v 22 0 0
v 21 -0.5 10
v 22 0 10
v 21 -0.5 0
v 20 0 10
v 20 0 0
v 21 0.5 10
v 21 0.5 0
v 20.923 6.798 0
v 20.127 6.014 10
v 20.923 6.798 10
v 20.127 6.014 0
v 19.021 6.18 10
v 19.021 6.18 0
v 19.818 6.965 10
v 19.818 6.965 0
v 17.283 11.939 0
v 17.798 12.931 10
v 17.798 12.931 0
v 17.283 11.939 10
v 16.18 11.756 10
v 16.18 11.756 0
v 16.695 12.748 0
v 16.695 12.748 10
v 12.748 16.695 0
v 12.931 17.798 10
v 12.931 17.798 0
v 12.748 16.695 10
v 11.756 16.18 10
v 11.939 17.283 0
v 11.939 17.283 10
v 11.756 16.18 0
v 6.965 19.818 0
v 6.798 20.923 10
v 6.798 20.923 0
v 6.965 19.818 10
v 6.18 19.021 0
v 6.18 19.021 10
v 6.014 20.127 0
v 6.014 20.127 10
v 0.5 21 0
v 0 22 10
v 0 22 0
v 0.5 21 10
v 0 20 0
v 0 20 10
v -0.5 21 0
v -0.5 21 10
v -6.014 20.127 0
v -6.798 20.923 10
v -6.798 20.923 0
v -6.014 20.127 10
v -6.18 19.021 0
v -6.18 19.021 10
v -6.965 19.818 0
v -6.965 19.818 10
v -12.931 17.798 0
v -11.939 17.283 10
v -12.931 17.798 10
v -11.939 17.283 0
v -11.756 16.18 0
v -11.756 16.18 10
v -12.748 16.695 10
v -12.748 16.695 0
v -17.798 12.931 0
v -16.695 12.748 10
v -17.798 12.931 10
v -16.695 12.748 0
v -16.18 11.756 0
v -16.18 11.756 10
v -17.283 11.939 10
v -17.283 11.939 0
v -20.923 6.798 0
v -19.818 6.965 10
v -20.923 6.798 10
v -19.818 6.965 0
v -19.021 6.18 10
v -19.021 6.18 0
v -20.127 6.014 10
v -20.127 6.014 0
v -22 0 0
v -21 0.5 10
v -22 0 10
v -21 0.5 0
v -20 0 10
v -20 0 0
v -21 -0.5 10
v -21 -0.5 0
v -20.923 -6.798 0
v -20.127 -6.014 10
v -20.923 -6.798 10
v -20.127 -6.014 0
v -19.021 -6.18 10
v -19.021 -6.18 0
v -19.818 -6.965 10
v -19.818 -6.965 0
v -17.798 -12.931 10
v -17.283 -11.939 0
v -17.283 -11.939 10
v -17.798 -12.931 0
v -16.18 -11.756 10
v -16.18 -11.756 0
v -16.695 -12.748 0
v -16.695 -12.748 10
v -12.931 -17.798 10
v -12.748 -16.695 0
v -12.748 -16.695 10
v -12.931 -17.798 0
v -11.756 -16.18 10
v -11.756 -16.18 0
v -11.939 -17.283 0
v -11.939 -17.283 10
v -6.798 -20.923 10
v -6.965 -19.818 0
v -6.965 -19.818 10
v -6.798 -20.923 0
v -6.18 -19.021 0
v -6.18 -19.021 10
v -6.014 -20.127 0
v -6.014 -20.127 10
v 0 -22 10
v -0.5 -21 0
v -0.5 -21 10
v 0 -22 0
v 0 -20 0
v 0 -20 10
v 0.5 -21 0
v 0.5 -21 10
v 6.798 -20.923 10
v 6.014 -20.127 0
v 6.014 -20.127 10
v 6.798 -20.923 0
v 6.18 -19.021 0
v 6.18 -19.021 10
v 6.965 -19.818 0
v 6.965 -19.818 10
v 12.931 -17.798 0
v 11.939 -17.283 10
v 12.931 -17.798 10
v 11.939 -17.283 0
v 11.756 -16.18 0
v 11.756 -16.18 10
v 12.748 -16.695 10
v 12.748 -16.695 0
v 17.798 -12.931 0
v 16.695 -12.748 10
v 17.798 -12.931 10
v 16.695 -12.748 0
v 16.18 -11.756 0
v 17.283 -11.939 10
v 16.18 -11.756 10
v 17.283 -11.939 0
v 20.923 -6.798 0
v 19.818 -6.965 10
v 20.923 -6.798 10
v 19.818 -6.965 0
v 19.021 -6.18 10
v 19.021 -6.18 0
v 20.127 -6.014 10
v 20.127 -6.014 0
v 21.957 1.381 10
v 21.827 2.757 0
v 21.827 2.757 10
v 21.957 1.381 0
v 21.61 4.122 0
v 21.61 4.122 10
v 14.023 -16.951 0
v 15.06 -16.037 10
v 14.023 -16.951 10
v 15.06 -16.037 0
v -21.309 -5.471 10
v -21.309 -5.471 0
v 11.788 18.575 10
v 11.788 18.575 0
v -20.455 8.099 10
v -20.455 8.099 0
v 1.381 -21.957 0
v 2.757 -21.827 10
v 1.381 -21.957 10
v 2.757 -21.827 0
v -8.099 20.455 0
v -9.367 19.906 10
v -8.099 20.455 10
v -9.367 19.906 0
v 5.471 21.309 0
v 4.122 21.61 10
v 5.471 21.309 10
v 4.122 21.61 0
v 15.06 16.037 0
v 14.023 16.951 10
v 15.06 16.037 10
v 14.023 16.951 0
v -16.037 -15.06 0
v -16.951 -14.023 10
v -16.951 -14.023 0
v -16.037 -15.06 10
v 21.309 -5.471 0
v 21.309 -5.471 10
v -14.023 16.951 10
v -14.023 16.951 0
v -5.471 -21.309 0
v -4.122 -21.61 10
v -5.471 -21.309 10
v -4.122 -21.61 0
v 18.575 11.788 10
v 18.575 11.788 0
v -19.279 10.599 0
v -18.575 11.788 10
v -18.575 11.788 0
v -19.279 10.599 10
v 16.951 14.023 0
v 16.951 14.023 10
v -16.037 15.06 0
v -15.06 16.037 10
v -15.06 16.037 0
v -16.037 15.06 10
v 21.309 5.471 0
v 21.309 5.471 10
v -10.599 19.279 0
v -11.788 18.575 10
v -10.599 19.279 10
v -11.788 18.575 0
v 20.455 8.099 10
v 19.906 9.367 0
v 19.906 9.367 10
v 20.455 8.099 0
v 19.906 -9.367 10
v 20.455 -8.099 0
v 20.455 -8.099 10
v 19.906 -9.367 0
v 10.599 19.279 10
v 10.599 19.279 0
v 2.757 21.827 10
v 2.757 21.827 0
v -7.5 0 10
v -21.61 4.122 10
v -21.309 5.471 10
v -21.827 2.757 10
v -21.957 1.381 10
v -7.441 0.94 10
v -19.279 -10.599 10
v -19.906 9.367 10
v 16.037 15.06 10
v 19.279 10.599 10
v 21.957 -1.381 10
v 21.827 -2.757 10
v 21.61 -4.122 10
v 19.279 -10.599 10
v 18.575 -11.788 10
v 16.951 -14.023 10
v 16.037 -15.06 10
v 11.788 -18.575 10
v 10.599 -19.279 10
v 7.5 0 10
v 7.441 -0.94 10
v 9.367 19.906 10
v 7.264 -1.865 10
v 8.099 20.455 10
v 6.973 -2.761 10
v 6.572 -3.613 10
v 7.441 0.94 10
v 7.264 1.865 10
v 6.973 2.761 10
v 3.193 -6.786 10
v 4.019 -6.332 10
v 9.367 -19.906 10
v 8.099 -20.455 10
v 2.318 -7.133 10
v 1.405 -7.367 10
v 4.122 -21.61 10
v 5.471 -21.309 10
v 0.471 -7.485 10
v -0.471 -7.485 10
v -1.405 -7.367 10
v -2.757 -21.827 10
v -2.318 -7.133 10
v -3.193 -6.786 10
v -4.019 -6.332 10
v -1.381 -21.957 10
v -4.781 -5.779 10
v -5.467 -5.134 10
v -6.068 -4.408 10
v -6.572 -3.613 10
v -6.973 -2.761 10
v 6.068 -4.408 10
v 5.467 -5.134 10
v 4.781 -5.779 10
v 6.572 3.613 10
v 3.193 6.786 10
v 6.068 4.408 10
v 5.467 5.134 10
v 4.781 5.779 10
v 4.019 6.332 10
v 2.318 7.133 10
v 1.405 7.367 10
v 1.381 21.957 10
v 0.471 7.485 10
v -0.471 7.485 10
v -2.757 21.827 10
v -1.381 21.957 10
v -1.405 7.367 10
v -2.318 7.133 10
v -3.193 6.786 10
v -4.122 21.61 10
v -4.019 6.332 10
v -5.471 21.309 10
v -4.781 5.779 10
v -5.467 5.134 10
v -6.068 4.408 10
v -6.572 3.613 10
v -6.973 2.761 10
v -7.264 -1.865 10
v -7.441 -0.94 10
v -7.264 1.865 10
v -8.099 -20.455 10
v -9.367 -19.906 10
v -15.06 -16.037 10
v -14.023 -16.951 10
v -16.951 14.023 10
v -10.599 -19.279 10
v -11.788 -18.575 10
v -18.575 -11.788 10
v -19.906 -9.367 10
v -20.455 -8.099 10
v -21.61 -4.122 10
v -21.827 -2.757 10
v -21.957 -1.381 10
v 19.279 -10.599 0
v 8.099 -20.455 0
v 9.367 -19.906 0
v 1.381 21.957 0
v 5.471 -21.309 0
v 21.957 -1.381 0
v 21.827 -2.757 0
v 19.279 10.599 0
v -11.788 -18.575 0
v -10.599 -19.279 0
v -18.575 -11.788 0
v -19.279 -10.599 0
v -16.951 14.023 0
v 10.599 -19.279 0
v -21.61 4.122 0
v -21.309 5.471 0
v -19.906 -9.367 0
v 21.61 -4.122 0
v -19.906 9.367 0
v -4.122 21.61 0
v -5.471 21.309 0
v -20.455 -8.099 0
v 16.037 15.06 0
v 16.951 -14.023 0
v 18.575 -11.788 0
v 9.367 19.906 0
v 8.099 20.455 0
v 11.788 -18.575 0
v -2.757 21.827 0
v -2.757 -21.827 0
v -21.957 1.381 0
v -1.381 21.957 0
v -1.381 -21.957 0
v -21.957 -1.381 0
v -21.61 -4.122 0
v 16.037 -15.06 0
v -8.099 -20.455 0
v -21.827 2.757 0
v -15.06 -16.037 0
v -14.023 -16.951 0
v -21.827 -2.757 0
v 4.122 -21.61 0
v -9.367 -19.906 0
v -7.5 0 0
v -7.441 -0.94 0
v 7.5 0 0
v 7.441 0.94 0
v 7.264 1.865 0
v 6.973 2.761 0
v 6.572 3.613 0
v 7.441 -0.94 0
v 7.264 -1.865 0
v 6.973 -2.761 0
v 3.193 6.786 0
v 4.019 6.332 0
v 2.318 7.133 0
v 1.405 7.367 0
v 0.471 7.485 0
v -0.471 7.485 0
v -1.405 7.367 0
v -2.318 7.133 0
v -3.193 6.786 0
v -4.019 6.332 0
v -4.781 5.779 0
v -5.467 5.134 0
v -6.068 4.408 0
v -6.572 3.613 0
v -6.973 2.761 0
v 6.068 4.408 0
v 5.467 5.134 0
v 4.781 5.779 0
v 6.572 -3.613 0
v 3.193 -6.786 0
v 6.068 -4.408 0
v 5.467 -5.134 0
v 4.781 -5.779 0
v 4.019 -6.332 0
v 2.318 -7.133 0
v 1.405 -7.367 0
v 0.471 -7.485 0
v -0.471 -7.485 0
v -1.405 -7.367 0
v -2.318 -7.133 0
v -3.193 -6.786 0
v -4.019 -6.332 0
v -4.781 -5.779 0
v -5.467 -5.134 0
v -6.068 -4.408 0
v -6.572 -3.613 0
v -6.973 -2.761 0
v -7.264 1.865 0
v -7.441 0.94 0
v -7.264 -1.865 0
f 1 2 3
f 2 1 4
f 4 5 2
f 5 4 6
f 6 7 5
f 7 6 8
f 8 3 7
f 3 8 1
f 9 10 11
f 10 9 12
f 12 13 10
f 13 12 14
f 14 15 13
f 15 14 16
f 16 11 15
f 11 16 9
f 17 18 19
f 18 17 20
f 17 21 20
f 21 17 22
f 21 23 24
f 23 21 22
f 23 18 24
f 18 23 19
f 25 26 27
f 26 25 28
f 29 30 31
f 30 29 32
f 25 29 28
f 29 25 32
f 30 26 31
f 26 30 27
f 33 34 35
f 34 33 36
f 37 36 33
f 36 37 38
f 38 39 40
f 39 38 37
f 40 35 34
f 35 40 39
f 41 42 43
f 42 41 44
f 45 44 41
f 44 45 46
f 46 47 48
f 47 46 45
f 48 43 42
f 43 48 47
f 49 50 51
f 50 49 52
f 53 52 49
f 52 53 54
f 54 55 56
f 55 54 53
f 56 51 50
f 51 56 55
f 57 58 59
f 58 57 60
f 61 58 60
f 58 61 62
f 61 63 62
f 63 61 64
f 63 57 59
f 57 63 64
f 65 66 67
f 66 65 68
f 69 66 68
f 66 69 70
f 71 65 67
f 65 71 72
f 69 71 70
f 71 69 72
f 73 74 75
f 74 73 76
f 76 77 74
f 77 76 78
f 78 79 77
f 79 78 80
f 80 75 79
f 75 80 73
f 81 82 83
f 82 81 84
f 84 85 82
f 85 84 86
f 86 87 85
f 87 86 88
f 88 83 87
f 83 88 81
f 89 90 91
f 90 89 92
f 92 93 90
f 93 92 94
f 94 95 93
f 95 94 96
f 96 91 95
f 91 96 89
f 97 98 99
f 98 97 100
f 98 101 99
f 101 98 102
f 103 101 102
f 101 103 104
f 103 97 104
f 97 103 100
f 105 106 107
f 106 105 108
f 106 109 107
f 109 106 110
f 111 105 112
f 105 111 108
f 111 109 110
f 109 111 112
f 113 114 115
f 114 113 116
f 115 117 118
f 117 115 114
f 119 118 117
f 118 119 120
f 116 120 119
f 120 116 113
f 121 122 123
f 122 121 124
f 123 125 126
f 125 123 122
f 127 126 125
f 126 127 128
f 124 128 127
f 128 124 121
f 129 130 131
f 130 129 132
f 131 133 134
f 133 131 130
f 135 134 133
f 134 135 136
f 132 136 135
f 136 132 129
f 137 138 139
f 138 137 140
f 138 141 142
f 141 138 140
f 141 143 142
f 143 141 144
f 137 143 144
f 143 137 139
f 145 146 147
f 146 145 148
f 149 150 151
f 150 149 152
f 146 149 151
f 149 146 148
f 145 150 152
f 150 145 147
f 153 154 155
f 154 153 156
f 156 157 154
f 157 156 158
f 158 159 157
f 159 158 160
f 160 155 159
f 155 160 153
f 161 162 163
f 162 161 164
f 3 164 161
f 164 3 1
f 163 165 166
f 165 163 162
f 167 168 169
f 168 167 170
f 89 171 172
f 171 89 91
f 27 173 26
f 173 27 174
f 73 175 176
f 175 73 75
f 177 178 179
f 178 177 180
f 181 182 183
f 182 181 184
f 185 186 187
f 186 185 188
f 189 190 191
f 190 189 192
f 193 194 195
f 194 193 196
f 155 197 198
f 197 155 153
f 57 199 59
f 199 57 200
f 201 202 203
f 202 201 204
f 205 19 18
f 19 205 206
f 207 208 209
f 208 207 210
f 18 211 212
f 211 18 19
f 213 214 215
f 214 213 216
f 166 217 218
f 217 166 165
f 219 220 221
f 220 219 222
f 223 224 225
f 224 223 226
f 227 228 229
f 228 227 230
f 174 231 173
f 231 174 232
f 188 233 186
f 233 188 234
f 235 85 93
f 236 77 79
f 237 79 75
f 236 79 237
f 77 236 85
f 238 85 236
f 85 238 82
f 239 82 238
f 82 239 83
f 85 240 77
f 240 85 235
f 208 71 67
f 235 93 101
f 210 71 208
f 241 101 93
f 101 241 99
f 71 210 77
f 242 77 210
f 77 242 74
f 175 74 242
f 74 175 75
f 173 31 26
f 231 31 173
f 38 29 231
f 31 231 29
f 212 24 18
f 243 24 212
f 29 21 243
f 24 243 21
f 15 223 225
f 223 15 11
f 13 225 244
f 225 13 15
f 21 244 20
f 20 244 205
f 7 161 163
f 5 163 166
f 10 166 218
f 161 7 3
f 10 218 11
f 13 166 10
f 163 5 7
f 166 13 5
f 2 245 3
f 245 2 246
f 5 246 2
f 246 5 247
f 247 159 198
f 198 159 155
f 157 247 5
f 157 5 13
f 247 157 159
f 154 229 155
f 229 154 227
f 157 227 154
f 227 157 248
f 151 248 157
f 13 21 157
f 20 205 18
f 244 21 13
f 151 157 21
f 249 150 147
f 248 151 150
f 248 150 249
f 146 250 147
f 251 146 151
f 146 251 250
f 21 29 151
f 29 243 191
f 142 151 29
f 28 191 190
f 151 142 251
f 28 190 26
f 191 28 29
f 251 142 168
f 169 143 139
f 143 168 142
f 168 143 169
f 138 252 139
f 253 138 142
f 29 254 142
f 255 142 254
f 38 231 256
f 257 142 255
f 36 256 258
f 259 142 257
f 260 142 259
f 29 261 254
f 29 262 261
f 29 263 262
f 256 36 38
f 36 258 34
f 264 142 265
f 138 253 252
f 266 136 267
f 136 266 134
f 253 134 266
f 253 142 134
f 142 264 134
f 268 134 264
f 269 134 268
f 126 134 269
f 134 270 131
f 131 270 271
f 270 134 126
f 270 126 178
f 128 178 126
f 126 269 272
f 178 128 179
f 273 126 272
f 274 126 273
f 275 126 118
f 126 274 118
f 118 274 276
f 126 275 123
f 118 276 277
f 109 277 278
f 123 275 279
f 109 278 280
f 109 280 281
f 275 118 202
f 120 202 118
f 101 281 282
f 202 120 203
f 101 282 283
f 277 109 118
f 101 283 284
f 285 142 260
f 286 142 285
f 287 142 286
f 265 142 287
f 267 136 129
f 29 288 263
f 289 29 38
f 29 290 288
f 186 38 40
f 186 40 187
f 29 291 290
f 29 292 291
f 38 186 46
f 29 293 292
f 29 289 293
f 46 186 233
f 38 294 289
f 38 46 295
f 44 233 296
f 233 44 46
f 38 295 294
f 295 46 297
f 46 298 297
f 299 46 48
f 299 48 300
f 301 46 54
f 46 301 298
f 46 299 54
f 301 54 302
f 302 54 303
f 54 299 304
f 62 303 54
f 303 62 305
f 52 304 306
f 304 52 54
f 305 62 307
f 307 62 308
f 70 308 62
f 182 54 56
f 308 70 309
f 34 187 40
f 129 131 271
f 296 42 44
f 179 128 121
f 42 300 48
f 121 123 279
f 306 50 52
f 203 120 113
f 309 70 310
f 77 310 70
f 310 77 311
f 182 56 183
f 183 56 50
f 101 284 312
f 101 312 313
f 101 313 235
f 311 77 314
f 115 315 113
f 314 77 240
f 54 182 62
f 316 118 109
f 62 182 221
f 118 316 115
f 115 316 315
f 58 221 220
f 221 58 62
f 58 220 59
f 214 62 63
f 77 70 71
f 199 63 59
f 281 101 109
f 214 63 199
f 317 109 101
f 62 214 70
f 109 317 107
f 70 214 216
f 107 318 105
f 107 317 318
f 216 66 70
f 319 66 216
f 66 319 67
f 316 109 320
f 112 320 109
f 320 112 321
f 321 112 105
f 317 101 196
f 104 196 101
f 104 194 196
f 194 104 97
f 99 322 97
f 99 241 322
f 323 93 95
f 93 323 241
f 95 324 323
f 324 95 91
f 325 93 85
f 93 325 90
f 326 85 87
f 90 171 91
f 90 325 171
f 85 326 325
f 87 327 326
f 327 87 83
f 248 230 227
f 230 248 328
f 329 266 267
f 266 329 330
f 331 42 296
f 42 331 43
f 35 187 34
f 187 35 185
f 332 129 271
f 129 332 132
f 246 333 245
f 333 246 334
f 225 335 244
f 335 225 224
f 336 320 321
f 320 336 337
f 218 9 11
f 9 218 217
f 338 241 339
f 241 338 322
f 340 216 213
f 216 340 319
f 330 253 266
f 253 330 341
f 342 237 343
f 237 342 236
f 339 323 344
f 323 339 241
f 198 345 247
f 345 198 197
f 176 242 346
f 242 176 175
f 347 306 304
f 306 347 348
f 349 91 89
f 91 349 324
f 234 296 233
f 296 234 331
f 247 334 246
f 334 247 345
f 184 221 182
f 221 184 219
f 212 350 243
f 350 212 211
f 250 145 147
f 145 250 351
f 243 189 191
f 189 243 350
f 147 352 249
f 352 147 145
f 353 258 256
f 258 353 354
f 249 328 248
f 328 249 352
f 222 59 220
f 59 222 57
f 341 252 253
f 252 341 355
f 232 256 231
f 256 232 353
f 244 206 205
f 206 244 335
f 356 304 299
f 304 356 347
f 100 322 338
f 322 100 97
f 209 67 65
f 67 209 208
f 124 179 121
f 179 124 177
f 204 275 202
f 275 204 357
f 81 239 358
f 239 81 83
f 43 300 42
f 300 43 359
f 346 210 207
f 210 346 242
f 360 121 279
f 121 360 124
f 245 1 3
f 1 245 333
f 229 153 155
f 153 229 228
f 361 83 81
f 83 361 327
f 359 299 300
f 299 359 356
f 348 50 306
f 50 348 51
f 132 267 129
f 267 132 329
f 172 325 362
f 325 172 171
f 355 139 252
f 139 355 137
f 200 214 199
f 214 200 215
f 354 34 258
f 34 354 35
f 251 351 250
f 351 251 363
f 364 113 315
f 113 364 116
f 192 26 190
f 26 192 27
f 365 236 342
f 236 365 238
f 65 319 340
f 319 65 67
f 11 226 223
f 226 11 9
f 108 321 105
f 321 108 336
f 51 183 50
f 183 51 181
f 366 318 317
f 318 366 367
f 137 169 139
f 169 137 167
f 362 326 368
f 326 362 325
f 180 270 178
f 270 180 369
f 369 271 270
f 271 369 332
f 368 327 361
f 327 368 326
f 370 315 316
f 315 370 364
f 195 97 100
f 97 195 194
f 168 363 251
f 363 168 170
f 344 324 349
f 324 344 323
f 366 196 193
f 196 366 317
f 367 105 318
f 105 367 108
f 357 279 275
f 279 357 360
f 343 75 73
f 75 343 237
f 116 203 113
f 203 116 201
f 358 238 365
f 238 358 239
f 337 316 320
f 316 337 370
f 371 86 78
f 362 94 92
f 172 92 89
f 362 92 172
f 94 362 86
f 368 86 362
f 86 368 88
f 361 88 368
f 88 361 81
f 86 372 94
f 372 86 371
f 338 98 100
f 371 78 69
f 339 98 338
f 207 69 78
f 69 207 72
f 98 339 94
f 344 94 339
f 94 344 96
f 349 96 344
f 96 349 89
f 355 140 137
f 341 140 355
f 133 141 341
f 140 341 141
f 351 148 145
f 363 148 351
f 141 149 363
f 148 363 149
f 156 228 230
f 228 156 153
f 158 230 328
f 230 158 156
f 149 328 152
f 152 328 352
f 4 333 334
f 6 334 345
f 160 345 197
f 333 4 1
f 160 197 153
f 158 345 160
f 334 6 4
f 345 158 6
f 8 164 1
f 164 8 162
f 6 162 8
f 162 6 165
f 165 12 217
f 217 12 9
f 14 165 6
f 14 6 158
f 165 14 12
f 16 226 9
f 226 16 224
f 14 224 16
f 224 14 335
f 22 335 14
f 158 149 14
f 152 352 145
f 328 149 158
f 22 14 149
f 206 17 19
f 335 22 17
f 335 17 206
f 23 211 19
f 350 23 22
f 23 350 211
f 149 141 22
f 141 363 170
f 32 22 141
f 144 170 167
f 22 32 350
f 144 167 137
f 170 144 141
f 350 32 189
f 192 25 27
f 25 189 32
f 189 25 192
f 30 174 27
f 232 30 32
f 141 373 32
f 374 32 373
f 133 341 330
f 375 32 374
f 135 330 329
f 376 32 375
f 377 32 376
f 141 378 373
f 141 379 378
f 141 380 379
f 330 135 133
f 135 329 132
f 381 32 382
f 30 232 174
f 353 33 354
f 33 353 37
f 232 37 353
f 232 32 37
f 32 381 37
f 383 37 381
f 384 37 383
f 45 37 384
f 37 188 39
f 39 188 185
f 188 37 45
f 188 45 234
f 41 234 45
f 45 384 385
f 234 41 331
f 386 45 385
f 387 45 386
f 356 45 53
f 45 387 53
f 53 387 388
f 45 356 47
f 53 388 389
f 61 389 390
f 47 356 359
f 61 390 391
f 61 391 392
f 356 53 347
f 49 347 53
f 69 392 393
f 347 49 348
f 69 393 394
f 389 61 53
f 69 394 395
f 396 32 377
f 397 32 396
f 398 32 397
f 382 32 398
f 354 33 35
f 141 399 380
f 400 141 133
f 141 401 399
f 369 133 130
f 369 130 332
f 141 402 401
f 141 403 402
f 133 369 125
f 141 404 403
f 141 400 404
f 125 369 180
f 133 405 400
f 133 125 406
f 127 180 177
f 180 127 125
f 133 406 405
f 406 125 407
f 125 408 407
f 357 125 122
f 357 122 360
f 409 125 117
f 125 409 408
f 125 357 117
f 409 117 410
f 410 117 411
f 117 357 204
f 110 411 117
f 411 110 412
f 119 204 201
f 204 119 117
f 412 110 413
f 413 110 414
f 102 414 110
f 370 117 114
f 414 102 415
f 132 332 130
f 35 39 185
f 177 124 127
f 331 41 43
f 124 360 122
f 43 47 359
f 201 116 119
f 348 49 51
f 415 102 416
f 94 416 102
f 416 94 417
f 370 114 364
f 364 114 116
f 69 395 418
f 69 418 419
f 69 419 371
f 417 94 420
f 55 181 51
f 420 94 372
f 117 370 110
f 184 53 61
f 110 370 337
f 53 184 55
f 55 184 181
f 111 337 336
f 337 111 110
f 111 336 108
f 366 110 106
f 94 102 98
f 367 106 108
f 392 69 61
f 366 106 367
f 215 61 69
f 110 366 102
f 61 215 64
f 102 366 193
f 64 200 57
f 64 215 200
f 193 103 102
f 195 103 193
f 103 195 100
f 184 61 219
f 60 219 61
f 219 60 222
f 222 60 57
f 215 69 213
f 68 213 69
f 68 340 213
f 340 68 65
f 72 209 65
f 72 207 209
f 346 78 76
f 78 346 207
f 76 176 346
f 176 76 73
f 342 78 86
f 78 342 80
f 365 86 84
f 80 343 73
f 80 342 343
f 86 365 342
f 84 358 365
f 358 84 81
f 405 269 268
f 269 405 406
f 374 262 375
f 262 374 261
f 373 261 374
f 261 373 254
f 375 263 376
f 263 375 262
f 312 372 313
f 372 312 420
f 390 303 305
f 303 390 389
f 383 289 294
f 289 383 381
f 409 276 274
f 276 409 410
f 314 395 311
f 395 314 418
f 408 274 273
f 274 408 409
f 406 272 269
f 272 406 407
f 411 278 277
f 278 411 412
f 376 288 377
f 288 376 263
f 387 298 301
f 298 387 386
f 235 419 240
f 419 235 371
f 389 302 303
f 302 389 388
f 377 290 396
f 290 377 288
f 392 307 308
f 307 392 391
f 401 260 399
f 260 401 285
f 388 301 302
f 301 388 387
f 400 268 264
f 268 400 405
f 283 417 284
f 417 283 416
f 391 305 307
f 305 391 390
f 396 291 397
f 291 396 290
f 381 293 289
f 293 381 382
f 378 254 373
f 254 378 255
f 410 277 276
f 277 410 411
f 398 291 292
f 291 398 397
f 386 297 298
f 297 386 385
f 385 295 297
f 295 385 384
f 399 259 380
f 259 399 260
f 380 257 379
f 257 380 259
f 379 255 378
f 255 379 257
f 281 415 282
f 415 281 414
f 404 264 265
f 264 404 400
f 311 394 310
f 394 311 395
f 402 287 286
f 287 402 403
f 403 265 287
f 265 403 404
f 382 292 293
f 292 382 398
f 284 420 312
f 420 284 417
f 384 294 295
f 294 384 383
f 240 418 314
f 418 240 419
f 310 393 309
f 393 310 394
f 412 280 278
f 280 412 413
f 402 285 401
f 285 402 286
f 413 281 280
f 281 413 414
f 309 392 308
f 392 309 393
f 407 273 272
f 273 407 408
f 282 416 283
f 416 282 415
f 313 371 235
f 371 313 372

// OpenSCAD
// 齿轮3D模型 - LLM自动生成
// 参数: 模数=2.0mm, 齿数=20, 压力角=20°, 齿宽=10mm, 孔径=15mm

// 齿轮参数
m = 2.0;           // 模数
z = 20;            // 齿数
alpha = 20;        // 压力角
b = 10;            // 齿宽
d_hole = 15;       // 孔径

// 计算几何参数
d = m * z;         // 分度圆直径
da = d + 2 * m;   // 齿顶圆直径
df = d - 2.5 * m; // 齿根圆直径
p = m * PI;        // 齿距

// 生成齿轮
gear();

module gear() {
    difference() {
        // 齿轮主体
        cylinder(h=b, d=da, $fn=100);
        
        // 中心孔
        cylinder(h=b+1, d=d_hole, $fn=50);
        
        // 齿槽
        for (i = [0:z-1]) {
            rotate([0, 0, i * 360/z])
            translate([d/2, 0, 0])
            tooth_space();
        }
    }
}

module tooth_space() {
    // 精确的齿槽形状
    translate([0, 0, -1])
    linear_extrude(height=b+2)
    polygon([
        [0, 0],
        [m/2, -m/4],
        [m, 0],
        [m/2, m/4]
    ]);
}

// 辅助函数
function PI() = 3.14159;
